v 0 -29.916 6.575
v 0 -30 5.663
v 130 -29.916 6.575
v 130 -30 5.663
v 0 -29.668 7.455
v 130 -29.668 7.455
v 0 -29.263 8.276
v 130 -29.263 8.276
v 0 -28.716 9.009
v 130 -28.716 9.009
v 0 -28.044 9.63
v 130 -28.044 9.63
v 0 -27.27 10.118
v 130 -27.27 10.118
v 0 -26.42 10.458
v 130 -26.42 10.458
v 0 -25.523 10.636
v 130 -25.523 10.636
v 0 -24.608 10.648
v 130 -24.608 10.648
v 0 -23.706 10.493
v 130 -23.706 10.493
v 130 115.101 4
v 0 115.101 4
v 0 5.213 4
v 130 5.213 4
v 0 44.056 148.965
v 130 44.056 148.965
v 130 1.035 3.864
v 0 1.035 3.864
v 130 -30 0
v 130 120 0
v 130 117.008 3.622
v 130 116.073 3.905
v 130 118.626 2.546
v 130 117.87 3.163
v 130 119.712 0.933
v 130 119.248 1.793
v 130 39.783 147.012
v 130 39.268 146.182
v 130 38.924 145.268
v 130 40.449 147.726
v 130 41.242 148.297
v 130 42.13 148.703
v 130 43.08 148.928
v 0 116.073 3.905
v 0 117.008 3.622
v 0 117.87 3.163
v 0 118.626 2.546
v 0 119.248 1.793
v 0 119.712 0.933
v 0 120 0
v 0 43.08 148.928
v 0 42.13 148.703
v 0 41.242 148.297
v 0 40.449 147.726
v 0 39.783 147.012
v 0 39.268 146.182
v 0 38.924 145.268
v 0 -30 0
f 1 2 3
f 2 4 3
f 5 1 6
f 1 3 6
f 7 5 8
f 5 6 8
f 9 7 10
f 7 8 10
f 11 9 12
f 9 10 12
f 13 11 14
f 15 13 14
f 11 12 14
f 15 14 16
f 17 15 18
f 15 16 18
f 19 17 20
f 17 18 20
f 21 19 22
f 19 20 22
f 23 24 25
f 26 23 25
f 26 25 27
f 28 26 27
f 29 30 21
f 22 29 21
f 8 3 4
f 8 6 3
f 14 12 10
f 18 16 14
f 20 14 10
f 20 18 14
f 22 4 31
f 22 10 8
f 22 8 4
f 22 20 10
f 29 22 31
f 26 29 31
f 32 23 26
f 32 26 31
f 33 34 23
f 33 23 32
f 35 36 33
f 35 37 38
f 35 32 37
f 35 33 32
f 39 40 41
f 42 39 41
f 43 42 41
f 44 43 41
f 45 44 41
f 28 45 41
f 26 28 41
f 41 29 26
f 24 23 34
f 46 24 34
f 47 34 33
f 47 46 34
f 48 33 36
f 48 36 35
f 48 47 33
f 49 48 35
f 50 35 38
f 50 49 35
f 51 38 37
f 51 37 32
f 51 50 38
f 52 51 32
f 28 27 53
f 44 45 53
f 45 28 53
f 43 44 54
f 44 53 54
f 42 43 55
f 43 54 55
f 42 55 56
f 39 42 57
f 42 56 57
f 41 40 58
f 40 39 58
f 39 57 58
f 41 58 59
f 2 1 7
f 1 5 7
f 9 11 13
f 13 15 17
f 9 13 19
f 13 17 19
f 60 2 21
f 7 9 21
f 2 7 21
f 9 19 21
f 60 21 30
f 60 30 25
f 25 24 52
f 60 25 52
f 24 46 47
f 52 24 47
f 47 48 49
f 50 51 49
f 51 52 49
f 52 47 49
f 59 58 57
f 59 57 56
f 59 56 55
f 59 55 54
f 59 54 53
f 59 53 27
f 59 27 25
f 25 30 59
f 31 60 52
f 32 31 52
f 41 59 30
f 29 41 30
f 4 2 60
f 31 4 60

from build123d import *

# Parameters (mm, degrees)
F1_DEPTH    = 130
F2_T1_DEPTH = 154.4948974279
F3_T1_DEPTH = 154.4948974279
F4_R        = 5


# Not quite as in the source:
# - a fillet or chamfer that OpenCascade refuses, or shapes differently, is made with other operations: its cross-section is extruded or revolved along the edge and cut away or added


with BuildPart() as f1:
    # F0 (on Right) → F1 (new body)
    with BuildSketch(Plane.YZ):
        Polygon((1.0352761804, 3.8637033052), (0, 0), (120, 0), (120, 4), (5.2129014914, 4), (44.0560821698, 148.9647238196), (40.1923788647, 150), align=None)
        Polygon((-30, 0), (0, 0), (1.0352761804, 3.8637033052), (-30, 12.1795804946), (-30, 4.0079755444), align=None)
    extrude(amount=F1_DEPTH)

    # F2: fillet of radius 5 on 1 edges, made by hand

    # F2_s2 → F2_t1 (cut)
    with BuildSketch(Plane.YZ.offset(-12.2474487139)):
        with BuildLine():
            ThreePointArc((44.0560821698, 148.9647238196), (40.8315018491, 148.0307814801), (38.9244296722, 145.2679491924))
            Line((38.9244296722, 145.2679491924), (40.1923788647, 150))
            Line((40.1923788647, 150), (44.0560821698, 148.9647238196))
        make_face()
    extrude(amount=F2_T1_DEPTH, mode=Mode.SUBTRACT)

    # F3: fillet of radius 5 on 1 edges, made by hand

    # F3_s2 → F3_t1 (cut)
    with BuildSketch(Plane.YZ.offset(-12.2474487139)):
        with BuildLine():
            ThreePointArc((115.1010205144, 4), (118.2632981746, 2.8729833462), (120, 0))
            Line((120, 0), (120, 4))
            Line((120, 4), (115.1010205144, 4))
        make_face()
    extrude(amount=F3_T1_DEPTH, mode=Mode.SUBTRACT)

    # F4
    f4_edges = [f1.edges().sort_by_distance(p)[0] for p in [
        (65, -30, 12.17958),
    ]]
    fillet(f4_edges, radius=F4_R)


solid = f1.part
